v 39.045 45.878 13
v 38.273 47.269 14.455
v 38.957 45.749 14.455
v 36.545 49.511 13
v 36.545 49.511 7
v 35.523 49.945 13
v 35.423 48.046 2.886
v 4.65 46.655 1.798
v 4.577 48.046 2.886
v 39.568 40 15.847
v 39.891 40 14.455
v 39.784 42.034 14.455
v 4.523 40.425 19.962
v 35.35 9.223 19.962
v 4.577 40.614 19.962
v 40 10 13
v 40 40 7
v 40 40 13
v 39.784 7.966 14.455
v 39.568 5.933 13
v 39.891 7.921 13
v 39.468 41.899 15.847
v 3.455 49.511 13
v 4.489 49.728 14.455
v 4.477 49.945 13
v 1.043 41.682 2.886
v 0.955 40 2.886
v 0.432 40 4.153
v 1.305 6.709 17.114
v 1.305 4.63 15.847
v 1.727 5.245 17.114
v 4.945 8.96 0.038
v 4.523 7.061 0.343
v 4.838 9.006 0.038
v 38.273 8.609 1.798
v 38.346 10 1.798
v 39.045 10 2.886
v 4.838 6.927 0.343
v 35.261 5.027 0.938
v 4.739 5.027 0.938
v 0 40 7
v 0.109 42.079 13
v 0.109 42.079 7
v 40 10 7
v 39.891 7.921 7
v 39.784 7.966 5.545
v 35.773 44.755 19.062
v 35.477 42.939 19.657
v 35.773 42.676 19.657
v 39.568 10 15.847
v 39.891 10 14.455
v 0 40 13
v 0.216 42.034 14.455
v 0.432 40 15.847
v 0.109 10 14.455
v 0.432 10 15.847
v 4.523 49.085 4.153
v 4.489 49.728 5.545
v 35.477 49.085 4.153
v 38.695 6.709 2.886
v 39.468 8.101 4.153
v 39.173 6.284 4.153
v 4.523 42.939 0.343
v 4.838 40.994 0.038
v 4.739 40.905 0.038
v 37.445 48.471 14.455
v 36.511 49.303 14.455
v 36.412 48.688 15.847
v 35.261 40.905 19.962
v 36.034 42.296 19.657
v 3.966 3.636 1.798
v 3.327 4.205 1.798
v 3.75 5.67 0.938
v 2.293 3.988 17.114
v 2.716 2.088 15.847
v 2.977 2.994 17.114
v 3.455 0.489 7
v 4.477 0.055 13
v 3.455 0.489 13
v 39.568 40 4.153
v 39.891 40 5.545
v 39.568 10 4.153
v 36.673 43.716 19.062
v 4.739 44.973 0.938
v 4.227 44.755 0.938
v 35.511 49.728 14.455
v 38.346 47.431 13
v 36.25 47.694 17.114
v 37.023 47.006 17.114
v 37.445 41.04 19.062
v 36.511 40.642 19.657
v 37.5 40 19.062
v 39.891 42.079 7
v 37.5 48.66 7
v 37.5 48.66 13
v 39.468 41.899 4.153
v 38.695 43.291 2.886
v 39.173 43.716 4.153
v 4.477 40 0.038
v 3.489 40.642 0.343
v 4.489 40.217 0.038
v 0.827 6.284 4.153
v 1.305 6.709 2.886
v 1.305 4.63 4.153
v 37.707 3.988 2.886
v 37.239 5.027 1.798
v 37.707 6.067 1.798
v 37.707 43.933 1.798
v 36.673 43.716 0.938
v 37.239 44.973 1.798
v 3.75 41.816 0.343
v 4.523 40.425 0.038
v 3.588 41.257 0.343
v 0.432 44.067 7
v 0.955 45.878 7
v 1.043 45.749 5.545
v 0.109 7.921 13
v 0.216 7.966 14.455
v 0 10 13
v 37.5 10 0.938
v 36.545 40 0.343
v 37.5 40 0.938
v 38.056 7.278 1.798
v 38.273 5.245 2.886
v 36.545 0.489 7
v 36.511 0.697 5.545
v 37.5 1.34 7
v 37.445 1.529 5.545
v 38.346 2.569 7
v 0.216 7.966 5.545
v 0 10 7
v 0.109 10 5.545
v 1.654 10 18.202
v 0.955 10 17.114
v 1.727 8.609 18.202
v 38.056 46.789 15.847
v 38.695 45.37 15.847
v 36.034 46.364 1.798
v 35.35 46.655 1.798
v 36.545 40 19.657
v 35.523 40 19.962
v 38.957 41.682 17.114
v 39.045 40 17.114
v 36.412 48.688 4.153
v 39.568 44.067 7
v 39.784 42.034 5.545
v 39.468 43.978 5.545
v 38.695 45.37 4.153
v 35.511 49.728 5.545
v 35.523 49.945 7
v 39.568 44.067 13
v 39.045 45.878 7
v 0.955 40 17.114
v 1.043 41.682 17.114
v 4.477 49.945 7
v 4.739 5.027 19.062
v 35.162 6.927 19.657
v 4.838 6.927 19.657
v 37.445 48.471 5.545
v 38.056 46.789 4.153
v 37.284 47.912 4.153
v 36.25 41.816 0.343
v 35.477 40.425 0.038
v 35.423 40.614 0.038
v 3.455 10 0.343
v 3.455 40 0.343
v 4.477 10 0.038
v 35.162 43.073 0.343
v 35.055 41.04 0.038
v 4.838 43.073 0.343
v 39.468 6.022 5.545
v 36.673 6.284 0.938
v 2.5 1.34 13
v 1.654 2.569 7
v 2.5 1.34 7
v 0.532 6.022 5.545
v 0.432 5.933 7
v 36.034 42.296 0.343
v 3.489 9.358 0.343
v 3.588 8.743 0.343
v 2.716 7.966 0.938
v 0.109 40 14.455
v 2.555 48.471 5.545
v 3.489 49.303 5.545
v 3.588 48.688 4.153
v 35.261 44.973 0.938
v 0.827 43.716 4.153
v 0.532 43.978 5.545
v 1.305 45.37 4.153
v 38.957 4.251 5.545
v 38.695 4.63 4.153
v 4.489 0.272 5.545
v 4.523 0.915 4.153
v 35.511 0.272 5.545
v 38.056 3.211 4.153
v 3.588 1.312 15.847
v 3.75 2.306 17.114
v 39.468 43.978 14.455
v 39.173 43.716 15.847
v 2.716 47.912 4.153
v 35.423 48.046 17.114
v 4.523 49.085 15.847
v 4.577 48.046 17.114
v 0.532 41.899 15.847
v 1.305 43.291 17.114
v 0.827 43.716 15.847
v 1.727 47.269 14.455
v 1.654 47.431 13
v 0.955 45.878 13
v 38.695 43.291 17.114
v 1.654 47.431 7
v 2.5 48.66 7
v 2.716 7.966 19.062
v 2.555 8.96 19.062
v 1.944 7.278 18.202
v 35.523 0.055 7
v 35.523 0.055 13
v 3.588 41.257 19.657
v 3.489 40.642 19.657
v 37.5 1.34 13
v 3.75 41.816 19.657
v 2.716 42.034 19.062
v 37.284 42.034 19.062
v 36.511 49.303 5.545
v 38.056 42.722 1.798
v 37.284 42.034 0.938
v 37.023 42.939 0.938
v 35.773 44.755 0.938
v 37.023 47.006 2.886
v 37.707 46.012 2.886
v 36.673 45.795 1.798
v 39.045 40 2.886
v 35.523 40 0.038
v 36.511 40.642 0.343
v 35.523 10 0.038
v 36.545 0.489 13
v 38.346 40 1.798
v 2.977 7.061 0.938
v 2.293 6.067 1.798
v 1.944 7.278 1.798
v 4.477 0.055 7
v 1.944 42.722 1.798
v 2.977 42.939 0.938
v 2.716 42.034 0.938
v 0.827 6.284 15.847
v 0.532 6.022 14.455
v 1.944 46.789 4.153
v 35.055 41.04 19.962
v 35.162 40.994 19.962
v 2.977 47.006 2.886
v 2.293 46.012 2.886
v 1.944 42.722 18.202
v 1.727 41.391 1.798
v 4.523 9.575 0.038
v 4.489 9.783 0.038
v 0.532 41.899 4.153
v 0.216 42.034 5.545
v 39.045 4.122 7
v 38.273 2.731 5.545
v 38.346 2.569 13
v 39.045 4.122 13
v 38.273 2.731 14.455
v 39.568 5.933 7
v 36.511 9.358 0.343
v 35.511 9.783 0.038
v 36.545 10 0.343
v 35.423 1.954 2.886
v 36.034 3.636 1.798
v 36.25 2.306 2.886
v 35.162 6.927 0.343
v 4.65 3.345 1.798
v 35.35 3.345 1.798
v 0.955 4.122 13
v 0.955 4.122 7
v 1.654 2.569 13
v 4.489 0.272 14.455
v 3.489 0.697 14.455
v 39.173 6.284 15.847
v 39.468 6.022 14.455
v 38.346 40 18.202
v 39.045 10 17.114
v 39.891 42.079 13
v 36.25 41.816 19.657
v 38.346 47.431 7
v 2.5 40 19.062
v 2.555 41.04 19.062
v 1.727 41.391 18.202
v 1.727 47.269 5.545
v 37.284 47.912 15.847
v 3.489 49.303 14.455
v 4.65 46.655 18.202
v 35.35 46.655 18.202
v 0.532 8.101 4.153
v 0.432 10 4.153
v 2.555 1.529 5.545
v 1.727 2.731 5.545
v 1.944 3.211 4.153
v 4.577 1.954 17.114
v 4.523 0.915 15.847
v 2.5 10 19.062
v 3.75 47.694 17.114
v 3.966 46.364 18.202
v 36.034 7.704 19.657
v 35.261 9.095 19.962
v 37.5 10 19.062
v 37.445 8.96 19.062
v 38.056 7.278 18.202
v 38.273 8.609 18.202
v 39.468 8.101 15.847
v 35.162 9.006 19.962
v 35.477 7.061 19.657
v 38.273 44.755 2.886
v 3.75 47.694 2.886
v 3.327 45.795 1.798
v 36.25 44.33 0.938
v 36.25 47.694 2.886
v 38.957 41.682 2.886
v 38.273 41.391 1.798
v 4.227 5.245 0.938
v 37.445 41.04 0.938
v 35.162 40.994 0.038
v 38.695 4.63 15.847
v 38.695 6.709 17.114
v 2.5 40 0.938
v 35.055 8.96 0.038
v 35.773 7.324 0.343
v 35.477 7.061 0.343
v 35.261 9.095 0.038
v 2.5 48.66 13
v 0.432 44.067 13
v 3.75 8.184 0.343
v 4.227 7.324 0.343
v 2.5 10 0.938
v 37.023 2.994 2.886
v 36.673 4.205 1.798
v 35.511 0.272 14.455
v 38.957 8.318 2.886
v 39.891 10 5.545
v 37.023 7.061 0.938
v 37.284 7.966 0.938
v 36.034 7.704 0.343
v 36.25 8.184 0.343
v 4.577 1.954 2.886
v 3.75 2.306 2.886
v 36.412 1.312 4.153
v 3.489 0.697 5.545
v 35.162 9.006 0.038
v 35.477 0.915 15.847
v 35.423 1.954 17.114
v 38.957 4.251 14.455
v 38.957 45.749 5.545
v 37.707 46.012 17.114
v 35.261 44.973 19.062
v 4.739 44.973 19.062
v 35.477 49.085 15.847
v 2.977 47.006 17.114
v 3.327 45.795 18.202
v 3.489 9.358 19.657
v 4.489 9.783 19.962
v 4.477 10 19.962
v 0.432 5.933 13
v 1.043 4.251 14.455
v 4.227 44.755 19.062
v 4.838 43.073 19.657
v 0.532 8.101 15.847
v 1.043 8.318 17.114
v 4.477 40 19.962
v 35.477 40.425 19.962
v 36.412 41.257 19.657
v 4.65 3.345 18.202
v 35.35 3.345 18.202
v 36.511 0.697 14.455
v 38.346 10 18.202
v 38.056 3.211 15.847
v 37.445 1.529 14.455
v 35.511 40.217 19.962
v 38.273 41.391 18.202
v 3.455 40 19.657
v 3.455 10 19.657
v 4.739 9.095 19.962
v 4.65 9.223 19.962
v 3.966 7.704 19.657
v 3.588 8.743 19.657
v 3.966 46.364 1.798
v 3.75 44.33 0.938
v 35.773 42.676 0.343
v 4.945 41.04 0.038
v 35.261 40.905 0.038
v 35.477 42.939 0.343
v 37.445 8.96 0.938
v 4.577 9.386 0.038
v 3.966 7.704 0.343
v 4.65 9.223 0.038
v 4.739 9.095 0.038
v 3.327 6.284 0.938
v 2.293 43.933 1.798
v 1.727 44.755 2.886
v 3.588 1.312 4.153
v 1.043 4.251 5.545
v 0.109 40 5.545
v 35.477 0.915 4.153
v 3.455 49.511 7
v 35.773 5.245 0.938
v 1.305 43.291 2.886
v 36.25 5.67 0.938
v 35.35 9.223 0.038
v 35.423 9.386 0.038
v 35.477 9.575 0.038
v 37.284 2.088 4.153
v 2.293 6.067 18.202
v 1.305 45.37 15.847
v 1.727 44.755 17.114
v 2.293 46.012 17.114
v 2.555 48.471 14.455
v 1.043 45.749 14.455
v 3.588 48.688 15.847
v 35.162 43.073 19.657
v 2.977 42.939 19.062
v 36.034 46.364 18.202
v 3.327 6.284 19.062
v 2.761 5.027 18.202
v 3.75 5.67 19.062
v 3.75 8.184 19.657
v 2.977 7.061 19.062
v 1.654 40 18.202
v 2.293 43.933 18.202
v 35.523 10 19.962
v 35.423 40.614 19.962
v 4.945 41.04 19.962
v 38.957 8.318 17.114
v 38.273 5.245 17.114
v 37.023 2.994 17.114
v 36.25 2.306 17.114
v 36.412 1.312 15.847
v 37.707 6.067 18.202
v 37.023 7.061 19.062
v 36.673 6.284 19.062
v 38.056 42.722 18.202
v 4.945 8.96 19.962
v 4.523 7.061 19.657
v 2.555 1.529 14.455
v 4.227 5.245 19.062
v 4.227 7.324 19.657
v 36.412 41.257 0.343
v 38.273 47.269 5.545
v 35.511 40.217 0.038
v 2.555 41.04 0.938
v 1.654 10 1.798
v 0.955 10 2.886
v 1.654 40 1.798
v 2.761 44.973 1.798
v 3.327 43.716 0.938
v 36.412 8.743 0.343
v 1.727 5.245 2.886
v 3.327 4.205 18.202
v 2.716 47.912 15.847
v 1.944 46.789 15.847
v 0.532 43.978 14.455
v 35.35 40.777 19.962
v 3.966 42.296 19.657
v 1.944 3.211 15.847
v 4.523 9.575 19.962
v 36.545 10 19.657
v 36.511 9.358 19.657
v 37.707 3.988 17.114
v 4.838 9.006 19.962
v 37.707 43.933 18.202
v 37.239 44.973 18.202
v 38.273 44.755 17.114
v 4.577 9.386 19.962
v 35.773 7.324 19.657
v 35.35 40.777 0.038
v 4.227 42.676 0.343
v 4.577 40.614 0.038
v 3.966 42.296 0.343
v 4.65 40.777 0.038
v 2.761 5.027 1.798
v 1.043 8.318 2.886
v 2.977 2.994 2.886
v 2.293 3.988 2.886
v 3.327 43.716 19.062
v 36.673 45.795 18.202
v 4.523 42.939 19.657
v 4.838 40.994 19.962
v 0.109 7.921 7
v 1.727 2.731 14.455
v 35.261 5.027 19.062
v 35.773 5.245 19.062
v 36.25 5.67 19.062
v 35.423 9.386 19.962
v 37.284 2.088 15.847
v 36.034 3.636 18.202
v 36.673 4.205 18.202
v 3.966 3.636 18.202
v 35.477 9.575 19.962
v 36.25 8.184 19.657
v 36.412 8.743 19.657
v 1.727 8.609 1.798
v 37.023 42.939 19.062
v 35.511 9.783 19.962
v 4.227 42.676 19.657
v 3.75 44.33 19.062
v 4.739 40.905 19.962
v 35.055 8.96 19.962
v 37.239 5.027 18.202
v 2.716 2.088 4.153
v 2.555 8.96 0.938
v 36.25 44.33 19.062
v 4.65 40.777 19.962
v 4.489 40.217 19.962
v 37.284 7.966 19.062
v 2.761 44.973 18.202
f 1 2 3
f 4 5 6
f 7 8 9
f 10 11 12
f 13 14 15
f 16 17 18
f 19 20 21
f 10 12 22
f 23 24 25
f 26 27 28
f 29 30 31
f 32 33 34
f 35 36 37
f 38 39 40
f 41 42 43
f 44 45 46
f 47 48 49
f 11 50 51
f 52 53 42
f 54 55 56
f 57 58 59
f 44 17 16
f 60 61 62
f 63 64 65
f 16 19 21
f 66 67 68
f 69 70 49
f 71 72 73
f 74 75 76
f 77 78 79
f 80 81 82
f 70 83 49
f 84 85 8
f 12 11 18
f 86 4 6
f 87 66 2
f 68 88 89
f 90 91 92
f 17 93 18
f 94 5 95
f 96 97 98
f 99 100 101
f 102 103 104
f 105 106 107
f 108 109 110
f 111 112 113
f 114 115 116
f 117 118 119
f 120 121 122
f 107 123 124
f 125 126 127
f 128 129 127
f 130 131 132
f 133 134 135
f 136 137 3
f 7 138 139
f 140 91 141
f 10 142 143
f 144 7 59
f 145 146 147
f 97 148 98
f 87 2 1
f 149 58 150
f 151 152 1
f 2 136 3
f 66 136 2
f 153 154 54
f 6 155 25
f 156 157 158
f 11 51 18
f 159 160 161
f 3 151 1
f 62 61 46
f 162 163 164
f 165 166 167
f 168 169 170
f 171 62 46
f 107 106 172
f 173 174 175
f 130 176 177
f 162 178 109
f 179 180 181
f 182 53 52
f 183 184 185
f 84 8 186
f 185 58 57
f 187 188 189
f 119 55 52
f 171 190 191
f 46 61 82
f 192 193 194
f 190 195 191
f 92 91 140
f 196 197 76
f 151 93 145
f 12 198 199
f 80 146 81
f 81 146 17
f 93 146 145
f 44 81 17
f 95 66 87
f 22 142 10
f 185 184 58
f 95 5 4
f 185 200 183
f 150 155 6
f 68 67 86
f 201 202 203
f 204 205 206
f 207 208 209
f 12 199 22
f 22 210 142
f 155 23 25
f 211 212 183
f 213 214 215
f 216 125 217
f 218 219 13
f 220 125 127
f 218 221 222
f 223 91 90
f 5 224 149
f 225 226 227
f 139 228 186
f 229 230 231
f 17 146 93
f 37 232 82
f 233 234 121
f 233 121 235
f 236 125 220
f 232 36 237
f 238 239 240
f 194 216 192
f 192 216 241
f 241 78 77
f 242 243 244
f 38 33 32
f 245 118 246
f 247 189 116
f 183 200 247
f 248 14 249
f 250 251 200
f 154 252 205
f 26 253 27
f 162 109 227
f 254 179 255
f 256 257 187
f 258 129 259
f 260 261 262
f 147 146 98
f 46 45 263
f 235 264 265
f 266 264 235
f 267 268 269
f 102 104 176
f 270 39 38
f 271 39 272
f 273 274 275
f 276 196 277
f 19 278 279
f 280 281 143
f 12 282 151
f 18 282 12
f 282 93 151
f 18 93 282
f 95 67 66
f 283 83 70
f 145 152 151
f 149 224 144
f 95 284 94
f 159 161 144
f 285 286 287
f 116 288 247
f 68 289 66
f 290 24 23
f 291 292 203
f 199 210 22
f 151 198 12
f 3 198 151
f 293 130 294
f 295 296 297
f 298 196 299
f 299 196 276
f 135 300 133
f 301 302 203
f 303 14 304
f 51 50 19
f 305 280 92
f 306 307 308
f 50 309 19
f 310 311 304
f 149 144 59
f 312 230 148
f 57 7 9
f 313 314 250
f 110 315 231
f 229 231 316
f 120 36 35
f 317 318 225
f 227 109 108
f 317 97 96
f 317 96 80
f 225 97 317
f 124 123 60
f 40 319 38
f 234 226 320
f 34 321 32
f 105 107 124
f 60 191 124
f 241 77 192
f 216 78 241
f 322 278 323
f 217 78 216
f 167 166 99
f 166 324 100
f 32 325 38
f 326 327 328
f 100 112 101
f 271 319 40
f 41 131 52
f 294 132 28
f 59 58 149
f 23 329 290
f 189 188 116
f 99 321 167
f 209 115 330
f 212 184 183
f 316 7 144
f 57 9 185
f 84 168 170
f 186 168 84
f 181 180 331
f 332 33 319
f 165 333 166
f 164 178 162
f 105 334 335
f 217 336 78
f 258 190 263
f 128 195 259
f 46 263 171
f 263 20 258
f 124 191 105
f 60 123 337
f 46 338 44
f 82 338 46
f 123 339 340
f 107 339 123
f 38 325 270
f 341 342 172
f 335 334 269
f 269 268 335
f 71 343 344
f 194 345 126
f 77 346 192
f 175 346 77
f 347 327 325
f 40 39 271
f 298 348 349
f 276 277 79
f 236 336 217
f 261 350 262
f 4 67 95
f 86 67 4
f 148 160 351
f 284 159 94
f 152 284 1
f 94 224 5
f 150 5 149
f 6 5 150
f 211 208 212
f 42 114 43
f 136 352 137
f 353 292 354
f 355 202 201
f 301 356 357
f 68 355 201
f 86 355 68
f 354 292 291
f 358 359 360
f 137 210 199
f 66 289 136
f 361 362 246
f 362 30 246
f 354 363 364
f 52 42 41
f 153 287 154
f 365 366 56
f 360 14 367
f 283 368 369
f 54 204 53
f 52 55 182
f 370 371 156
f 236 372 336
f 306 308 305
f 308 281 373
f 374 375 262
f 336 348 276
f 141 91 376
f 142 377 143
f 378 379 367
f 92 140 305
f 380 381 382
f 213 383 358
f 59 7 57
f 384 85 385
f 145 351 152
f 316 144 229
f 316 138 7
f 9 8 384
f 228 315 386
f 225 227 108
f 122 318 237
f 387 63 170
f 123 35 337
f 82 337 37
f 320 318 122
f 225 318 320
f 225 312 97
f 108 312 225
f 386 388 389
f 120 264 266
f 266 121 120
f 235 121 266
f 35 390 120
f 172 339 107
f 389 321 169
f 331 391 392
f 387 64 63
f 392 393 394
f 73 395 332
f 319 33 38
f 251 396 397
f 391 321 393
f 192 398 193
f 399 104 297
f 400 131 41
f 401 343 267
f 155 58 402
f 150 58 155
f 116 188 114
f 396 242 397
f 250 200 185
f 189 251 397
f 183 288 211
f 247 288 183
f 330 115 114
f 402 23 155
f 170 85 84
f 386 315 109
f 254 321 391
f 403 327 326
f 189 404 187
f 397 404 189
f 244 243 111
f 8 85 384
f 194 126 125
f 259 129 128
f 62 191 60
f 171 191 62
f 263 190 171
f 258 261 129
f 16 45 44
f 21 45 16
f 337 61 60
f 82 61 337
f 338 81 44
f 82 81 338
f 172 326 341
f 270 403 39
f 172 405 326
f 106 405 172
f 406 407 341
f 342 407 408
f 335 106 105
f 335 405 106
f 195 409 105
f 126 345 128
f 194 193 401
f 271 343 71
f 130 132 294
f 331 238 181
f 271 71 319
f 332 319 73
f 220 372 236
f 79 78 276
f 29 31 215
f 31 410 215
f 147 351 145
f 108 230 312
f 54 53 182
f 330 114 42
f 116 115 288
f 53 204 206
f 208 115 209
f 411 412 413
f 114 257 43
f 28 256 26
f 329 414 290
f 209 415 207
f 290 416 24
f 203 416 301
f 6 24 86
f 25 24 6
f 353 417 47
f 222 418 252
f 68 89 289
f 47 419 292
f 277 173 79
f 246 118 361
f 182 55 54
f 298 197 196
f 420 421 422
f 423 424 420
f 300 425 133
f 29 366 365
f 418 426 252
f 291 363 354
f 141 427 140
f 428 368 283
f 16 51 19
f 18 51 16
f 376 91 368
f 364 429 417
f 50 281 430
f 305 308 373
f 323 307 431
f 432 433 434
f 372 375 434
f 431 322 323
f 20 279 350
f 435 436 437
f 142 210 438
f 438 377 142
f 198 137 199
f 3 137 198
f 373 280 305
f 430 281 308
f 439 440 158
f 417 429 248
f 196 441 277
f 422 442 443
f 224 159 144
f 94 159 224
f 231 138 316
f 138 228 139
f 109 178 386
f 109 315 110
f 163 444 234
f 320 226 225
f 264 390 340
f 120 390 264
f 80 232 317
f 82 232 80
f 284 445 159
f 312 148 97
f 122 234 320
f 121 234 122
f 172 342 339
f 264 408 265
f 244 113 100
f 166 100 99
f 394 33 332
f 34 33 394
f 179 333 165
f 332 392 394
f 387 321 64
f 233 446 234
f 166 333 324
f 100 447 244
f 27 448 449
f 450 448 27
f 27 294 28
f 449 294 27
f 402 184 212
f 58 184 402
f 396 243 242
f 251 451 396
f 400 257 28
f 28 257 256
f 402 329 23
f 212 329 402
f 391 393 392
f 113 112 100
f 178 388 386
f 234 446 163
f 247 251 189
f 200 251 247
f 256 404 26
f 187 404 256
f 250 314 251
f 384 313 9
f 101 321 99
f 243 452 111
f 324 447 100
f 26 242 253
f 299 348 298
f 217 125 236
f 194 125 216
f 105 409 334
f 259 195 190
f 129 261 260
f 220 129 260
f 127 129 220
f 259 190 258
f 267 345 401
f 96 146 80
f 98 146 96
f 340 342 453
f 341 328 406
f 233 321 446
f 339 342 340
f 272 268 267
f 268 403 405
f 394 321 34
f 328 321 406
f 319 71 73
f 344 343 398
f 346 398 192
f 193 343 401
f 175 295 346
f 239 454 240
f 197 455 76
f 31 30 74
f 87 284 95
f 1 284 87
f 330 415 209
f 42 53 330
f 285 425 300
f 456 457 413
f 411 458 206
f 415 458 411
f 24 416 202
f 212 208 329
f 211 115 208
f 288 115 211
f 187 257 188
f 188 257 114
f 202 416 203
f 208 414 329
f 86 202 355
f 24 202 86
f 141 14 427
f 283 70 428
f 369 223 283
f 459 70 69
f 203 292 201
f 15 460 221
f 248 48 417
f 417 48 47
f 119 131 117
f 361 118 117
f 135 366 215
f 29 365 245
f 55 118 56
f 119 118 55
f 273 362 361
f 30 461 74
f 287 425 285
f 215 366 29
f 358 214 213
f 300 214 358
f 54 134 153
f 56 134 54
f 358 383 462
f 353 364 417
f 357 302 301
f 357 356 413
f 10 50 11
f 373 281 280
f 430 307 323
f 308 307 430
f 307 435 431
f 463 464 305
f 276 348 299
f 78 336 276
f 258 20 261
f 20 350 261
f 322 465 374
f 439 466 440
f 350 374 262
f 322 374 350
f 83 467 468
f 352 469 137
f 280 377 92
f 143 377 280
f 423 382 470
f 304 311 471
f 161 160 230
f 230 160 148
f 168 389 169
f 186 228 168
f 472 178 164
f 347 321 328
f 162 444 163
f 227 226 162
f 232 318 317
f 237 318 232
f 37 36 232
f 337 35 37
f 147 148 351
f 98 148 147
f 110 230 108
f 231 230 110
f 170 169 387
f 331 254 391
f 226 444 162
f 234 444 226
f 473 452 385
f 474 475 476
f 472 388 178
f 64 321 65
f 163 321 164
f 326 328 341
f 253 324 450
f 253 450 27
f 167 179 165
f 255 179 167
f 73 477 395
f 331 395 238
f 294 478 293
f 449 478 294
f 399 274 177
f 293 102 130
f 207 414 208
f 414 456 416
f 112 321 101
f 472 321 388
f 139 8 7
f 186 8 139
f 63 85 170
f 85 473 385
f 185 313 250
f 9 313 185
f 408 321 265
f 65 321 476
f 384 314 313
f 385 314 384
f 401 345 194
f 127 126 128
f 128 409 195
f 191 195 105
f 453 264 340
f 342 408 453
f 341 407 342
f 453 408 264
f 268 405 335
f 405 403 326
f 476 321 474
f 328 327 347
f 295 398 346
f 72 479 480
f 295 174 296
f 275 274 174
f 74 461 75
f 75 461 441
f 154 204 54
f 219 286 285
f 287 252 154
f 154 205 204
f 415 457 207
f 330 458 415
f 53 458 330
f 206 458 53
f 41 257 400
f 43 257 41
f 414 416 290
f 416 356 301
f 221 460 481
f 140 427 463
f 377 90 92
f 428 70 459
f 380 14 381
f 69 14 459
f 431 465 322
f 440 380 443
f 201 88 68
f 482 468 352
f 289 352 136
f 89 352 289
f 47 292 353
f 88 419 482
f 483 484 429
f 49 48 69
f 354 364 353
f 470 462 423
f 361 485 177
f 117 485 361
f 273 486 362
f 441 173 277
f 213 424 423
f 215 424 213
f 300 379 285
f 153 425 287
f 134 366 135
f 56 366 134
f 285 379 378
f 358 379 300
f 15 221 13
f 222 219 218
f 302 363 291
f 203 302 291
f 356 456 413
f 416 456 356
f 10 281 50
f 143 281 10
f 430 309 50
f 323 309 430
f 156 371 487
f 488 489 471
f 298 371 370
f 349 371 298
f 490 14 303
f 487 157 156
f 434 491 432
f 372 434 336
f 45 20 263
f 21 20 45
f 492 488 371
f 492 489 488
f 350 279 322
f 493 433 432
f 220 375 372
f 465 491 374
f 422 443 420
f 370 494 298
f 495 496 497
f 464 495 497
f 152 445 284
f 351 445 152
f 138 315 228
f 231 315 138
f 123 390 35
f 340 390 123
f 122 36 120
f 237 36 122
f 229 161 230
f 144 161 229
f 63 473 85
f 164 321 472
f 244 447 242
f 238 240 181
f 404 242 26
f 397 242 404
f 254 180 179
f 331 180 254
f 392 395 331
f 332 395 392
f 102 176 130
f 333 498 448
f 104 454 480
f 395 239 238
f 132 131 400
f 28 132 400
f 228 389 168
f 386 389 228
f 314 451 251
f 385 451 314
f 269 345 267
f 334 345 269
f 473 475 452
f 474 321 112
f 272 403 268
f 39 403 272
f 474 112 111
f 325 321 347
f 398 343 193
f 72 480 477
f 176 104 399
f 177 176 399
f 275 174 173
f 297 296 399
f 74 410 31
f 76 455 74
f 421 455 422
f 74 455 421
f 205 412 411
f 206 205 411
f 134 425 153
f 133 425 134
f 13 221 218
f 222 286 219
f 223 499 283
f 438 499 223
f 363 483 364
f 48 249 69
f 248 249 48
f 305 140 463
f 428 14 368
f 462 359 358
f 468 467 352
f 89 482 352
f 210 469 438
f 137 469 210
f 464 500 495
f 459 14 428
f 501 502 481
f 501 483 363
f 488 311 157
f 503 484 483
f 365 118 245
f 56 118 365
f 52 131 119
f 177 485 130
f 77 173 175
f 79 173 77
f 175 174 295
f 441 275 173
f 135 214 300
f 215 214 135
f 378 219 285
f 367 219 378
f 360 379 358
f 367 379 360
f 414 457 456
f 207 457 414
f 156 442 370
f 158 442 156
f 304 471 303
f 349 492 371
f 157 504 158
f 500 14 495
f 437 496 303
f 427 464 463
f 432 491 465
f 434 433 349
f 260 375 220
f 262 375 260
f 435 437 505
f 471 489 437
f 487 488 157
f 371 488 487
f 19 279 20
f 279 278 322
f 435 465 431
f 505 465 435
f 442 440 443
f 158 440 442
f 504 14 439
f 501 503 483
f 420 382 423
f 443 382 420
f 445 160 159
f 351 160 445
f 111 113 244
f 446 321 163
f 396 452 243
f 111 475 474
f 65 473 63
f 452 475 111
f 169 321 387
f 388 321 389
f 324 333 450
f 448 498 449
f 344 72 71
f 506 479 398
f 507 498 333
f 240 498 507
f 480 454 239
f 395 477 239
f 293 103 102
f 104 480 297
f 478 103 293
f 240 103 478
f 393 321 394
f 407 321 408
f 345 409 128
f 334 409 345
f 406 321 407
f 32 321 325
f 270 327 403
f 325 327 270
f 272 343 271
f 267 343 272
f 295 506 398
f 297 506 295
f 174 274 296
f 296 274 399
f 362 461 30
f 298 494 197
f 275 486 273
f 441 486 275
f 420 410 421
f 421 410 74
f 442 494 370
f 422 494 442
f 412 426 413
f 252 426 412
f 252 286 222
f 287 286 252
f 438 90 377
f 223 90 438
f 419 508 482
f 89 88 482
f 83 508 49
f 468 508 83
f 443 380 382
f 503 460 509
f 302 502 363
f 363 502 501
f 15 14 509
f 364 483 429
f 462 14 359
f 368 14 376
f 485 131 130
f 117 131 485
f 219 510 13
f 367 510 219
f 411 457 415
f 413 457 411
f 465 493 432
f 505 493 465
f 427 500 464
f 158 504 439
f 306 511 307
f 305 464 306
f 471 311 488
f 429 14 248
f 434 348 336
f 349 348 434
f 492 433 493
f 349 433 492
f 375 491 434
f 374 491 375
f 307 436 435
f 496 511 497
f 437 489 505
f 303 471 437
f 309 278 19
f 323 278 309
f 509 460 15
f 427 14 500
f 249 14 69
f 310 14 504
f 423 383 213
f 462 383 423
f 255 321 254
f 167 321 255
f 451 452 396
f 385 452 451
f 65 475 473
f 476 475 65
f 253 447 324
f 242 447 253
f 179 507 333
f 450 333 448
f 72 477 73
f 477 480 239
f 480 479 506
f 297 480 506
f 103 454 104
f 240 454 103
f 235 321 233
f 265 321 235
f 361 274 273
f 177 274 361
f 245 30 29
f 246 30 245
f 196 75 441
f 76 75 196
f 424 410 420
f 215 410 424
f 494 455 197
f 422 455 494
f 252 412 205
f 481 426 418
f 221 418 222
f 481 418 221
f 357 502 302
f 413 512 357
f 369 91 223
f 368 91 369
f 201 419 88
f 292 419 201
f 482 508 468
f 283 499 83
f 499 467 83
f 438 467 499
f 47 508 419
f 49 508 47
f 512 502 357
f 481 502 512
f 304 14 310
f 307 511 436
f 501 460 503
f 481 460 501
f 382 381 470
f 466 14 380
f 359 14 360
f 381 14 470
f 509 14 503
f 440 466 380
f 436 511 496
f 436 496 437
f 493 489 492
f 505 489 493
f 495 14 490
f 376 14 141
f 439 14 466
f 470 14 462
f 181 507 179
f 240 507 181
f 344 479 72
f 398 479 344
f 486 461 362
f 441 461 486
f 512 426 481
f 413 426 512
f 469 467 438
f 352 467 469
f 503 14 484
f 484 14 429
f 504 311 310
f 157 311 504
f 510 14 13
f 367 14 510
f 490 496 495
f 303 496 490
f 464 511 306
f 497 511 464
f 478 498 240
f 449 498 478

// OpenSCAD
/*
 *  OpenSCAD utilities 
 *
 *  by Ph.Gregoire AKA Greg Ware <greg.ware@laposte.net>
 *  
 *  Includes:
 *   - shorter macro modules to get a cube or cylinder with translation and rotation
 *   -  Due to some display defects in OpenSCAD preview (F5), some can use a small epsilon 
 *      so as to cut protruding apertures in solids
 *   - useful modules to build rounded corner cubes, triangle (wedges), etc
 *
 * History
 * Date         Author      Description
 * 2017/??/??   Ph.Gregoire Initial version(s)
 * 2018/07/18   Ph.Gregoire Rework for X5S corners
 *
 *  This work is licensed under the 
 *  Creative Commons Attribution 3.0 Unported License.
 *  To view a copy of this license, visit
 *    http://creativecommons.org/licenses/by/3.0/ 
 *  or send a letter to 
 *    Creative Commons, PO Box 1866, Mountain View, CA 94042, USA.
*/

// Thickness of supports for apertures
$_SUPPORT_THK=0.2;

// Cylinders $fn default
$_FN_CYL=32;

// Epsilon
$_EPSILON=0.2;

/* Simple translation */
module tr(dx,dy=0,dz=0) {
    translate([dx,dy,dz]) children();
}

/* Simple rotation */
module rot(ax,ay=0,az=0) {
    rotate([ax,ay,az]) children();
}

/* Translate and rotate children */
module trrot(tx,ty,tz,ax,ay=0,az=0) {
    translate([tx,ty,tz]) rotate([ax,ay,az]) children();
}

/* translated cube */
module trcube(tx,ty,tz,dx,dy,dz) {
    translate([tx,ty,tz]) cube([dx,dy,dz]);
}

/* translated cube with epsilons along Z */
module trcube_eps(tx,ty,tz,dx,dy,dz) {
    translate([tx,ty,tz-$_EPSILON]) cube([dx,dy,dz+2*$_EPSILON]);
}

/* translated cylinder */
module trcyl(tx,ty,tz,d,h,center=false,fn=$_FN_CYL) {
	translate([tx,ty,tz]) cylinder(d=d,h=h,center=center,$fn=fn);
}

/* cylinder with epsilon along Z axis */
module cyl_eps(d,h,center=false,fn=$_FN_CYL) {
    cylinder(d=d,h=h+2*$_EPSILON,center=center,$fn=fn);
}

/* translated cylinder with epsilon along height (Z) */
module trcyl_eps(tx,ty,tz,d,h,center=false,fn=$_FN_CYL) {
    translate([tx,ty,tz-$_EPSILON]) cyl_eps(d,h,center=center,fn=fn);
}

module trrotcyl(tx,ty,tz,ax,ay,az,d,h,center=false,fn=$_FN_CYL) {
	trrot(tx,ty,tz,ax,ay,az) cylinder(d=d,h=h,center=center,$fn=fn);
}

/* translated and rotated cylinder with epsilon along height (Z) */
module trrotcyl_eps(tx,ty,tz,ax,ay,az,d,h,center=false,fn=$_FN_CYL) {
    trrot(tx,ty,tz,ax,ay,az) translate([0,0,-$_EPSILON]) cylinder(d=d,h=h+2*$_EPSILON,center=center,$fn=fn);
}

/* translated and rotated cube */
module trrotcube(tx,ty,tz,ax,ay,az,dx,dy,dz,center=false) {
    trrot(tx,ty,tz,ax,ay,az) cube([dx,dy,dz],center=center);
}

/* rotated and translated cube */
module rottrcube(tx,ty,tz,ax,ay,az,dx,dy,dz,center=false) {
    rotate([ax,ay,az]) tr(tx,ty,tz) cube([dx,dy,dz],center=center);
}

/* Translated rotate cube with diff children (in cube referential) */
module trrotcube_diff(tx,ty,tz,ax,ay,az,dx,dy,dz) {
    trrot(tx,ty,tz,ax,ay,az) difference() {
        cube([dx,dy,dz]);
        children();
    }
}

/* Box with apertures cut out from children */
module boxWithApertures(w,l,h,t) {
    // Bottom
    trcube(-w/2-t,-l/2-t,0,w+2*t,l+2*t,t);

    // sides
    for(s=[0:3]) {
        L=w*((s+1)%2)+l*(s%2)+2*t;
        P=l*((s+1)%2)+w*(s%2);
        
        rotate([0,0,s*90]) {
            translate([-L/2,P/2,t]) {
                difference() {
                    cube([L,t,h]);
                    // aperture
                    if($children>s) {
                        translate([thk,thk,0]) rotate([90,0,0]) children(s);
                    }
                }
            }
        }
    }

}

/* Make a support: remove a thin support layer from a flat shape */
module supportDiff(thk) {
    difference() {
        children(0);
        translate([0,0,thk/2]) {
            linear_extrude(height=$_SUPPORT_THK) projection() children(0);
        }
    }
}

/* Lateral vents 
    n: number of vents
    h: height of vent and vent spacing
    l: horizontal length of vent
    x: horizontal x offset of vent
    z: vertical offset of first vent
    t: thickness of panel
*/
module vents(n,h,l,x,z,t) {
    for(v=[0:n-1]) {
        trcube_eps(x,z+2*v*h,0,l,h,t);
    }
}

/* Fan vent 
    w: width of panel
    dz: height of center of fan
    df: diameter of fan
    dh: diameter of hub
    fs: Number of fan spokes
    t: thickness of panel
*/
module fanvent(w,dz,df,dh,fs,t) {
    difference() {
        // External
        trcyl_eps(w/2,dz,0,df,t);
        
        // central hub
        trcyl_eps(w/2,dz,0,dh,t);
        
        // spokes
        translate([w/2,dz,0]) {
            for(a=[0:fs-1]) {
                rotate([0,0,180+a*(360/fs)]) trcube_eps(-t/2,0,0,t,df,t);
            }
        }
    }
}
/* Fan mounting holes
    w: Width of panel
    dz: height of center of fan
    wfh: width of fan holes
    dfh: diameter of fan holes
    t: thickness of panel
*/
module fanholes(w,dz,wfh,dfh,t) {
    for(x=[-1,1]) {
        for(y=[-1,1]) {
            trcyl_eps(w/2+wfh/2*x,dz+wfh/2*y,0,dfh,t);
        }
    }
}

/* Position children in one corner of box, using a centered box */
module cornerPos(w,l,h,x,y,center=true) {
    translate([center?x*w/2:(x+1)*w/2,center?y*l/2:(y+1)*l/2,h]) {
        if(x==-1 && y==-1) children();
        if(x==1 && y==-1) rotate([0,0,90]) children();
        if(x==1 && y==1) rotate([0,0,180]) children();
        if(x==-1 && y==1) rotate([0,0,270]) children();
    }
}

/* Position children at each 4 corners of centered cube */ 
module cornersPos(w,l,h,center=true) {
 for(x=[-1,1]) {
        for(y=[-1,1]) {
            cornerPos(w,l,h,x,y,center=center) children();
        }
    }
}


/* Quarter Cone */
module quarterCone(r1,r2,h) {
    intersection() {
        cylinder(r1=r2,r2=r1,h=h);
        cube([r1>r2?r1:r2,r1>r2?r1:r2,h]);
    }
}

module quarterCyl(r,h) {
    intersection() {
        cylinder(r=r,h=h,$fn=$_FN_CYL);
        cube([r,r,h]);
    }
}

/* Corner rounding */
module champfer(rounding,h) {
    difference() {
        translate([-$_EPSILON,-$_EPSILON,-$_EPSILON])
            cube([rounding+$_EPSILON,rounding+$_EPSILON,h+2*$_EPSILON]);
        translate([rounding,rounding])
            cylinder(r=rounding,h=h);
    }
}

/* Triangle by extrusion. the a parameter is the rotation angle */
module triangle(dx,dy,h,a=0) {
    if(a<0) triangle(dx,dy,h,a=a+360);
    else {
        a=a%360;
        linear_extrude(height=h) {
            if(a<90) polygon(points=[[0,0],[dx,0],[0,dy],[0,0]]);
            else if(a<180) polygon(points=[[0,0],[dx,dy],[dx,0],[0,0]]);
            else if(a<270) polygon(points=[[dx,dy],[0,dy],[dx,0],[dx,dy]]);
            else if(a<360) polygon(points=[[0,0],[dx,dy],[0,dy],[0,0]]);
        }
    }
}

module roundedFlatBox(dx,dy,h,r) {
    linear_extrude(height=h)
    offset(r=r)
    translate([r,r]) square([dx-2*r,dy-2*r]);
}

module roundedBoundingBox(dx,dy,dz,rx,ry,rz) {
    minkowski() {
        trcube(rx,ry,rz,dx-2*rx,dy-2*ry,dz-2*rz);
        r=max(rx,ry,rz);
        scale([rx/r,ry/r,rz/r]) sphere(r);
    }
}

test();

module test() {
    //triangle(30,20,10,270);
    //quarterCyl(5,10);
    //champfer(5,10);
    roundedBoundingBox(40,50,20,5,10,7);
}
